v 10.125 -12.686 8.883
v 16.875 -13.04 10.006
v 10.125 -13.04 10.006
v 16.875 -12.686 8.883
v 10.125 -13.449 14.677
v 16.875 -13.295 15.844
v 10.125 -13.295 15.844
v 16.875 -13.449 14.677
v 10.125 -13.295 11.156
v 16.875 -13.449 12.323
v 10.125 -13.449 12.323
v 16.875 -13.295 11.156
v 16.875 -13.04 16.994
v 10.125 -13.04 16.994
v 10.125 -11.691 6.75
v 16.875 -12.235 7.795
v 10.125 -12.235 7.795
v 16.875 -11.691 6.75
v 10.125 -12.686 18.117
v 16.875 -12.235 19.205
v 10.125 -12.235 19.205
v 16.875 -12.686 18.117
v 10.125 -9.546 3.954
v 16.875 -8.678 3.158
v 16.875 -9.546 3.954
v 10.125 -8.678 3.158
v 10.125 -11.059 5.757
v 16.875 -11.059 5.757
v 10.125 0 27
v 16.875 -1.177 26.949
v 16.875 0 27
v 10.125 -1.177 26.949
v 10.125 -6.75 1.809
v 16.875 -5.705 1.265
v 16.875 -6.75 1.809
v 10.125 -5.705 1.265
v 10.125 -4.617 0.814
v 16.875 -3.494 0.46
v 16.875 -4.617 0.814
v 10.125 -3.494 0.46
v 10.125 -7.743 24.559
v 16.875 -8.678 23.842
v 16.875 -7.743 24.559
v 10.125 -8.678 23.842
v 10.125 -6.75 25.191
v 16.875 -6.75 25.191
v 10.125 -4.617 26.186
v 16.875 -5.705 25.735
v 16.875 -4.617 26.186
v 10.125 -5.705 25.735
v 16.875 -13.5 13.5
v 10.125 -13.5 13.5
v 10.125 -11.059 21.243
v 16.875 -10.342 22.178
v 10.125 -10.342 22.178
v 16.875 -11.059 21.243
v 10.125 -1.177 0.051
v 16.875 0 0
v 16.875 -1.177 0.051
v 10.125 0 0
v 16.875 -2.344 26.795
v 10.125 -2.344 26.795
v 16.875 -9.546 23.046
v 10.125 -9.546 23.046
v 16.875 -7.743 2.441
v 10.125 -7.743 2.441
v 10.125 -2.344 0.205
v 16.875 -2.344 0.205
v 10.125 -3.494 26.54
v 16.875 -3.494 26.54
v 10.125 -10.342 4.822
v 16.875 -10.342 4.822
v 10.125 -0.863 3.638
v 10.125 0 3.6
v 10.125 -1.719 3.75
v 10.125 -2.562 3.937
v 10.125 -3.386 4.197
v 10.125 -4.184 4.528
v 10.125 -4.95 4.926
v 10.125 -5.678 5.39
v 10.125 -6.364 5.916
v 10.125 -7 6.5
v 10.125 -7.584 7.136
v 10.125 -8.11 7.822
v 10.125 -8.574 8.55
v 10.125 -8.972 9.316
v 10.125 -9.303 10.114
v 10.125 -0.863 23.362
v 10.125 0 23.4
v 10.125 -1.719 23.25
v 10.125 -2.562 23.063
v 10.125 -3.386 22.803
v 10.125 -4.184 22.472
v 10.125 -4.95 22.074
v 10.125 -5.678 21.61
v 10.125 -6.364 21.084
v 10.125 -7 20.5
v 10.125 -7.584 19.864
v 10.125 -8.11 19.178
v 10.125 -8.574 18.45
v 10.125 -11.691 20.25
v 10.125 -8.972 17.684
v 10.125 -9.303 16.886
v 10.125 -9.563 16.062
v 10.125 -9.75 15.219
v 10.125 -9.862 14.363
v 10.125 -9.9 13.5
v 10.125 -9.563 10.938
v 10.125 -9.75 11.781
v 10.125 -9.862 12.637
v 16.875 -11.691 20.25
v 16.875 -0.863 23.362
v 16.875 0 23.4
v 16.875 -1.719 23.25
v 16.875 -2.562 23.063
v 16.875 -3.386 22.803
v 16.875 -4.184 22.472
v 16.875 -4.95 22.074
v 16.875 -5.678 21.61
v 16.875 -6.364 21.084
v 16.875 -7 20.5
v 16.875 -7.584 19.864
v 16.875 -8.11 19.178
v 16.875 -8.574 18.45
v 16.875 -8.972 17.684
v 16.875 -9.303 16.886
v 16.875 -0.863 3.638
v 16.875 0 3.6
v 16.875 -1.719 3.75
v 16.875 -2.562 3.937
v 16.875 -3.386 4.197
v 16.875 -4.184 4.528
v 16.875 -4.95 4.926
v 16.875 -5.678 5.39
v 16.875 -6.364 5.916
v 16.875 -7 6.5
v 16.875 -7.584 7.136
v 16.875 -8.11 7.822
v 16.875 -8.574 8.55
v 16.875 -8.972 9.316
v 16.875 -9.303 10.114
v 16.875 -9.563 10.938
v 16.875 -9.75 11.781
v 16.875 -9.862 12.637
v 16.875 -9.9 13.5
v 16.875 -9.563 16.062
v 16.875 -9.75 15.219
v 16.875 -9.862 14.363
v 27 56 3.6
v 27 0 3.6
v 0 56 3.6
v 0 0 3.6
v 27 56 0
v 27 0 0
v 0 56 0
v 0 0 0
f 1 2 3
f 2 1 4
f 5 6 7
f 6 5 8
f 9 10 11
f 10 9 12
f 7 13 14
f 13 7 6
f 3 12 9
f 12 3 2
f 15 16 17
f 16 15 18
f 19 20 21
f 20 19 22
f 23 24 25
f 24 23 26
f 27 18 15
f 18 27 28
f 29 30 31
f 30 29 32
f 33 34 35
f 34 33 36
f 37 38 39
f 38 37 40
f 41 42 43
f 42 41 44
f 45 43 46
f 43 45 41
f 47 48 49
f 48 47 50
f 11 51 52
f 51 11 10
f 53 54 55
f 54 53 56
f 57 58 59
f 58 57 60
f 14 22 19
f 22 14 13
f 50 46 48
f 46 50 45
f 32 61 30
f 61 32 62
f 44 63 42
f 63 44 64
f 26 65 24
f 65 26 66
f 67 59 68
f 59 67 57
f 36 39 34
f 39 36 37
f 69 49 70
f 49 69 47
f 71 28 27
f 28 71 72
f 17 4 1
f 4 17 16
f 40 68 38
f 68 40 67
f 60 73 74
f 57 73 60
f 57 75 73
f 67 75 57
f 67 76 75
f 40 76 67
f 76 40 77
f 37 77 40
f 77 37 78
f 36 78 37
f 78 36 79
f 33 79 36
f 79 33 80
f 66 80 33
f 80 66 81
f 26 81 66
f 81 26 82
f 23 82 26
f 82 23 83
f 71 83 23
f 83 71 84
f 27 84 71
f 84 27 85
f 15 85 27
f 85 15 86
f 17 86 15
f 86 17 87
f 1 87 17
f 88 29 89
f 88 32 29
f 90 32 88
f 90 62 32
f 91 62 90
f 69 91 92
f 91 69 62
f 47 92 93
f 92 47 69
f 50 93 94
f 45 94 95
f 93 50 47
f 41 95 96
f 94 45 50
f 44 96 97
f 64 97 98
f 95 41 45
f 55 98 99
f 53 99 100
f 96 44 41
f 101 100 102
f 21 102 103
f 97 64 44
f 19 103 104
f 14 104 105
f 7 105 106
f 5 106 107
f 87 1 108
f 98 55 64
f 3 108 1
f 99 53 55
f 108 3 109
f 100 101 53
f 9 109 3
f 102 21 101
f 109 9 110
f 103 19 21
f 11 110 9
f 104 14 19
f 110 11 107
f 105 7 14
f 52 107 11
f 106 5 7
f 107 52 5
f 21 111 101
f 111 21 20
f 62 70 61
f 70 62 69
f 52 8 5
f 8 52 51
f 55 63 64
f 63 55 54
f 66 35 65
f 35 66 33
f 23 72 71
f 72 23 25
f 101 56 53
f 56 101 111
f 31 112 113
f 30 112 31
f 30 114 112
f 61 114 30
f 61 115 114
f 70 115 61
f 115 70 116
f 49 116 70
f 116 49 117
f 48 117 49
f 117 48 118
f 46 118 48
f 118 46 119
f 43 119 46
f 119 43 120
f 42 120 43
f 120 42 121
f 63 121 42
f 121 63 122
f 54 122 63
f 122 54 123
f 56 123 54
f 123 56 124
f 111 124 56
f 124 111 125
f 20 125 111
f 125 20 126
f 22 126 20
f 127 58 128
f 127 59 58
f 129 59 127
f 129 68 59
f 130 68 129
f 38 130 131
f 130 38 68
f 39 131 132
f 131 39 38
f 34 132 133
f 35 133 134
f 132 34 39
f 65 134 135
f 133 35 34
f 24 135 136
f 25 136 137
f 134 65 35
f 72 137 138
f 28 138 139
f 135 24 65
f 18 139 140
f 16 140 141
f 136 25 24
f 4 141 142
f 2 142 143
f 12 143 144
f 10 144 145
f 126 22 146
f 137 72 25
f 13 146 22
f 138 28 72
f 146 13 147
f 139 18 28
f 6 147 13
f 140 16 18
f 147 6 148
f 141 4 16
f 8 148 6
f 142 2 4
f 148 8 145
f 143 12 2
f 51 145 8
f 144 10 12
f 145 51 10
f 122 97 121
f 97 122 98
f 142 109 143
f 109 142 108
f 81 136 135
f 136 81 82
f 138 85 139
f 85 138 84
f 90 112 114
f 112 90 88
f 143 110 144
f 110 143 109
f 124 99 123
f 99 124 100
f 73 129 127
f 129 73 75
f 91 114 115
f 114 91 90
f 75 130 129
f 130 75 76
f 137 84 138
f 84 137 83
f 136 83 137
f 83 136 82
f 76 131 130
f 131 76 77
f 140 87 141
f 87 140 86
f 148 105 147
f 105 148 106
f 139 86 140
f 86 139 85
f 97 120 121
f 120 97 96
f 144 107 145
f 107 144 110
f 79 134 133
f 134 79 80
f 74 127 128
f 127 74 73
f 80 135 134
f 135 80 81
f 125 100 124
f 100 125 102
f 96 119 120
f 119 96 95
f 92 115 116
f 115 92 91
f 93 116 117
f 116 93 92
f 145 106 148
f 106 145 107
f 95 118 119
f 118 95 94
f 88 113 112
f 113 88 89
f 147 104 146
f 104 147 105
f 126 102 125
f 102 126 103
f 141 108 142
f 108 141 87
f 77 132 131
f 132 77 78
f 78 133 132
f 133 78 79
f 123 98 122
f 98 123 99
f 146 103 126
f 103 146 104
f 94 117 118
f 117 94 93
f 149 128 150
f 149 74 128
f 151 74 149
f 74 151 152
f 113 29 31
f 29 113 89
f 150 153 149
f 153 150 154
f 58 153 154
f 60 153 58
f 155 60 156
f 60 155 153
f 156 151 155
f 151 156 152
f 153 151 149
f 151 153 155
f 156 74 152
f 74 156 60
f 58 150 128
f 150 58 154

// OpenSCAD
$fn=72;
//Toleranz
to=1;
//Breite Klebeband
bk=25+to*2;
//Hoehe Haken
hh=(bk*2)+(to*2);
//Dicke
t=3.6;
//Dicke Cylinder
dc=bk;
//Breite Cylinder
hc=bk/4;
//Dicke Cylinder2
dc2=dc-t*2;
//Breite Cylinder2
hc2=hc;

m=bk/2-hc/2;

module klebeflaeche()
{
    cube([bk,hh,t]);
}

klebeflaeche();

difference()
{
translate([m,0,dc/2])
rotate([0,90,0])
cylinder(h=hc, d=dc);

color("blue")
translate([m,0,dc/2])
rotate([0,90,0])
cylinder(h=hc2, d=dc2);

color("red")
translate([m,0,t])
cube([hc,dc2,dc2+t]);
}
